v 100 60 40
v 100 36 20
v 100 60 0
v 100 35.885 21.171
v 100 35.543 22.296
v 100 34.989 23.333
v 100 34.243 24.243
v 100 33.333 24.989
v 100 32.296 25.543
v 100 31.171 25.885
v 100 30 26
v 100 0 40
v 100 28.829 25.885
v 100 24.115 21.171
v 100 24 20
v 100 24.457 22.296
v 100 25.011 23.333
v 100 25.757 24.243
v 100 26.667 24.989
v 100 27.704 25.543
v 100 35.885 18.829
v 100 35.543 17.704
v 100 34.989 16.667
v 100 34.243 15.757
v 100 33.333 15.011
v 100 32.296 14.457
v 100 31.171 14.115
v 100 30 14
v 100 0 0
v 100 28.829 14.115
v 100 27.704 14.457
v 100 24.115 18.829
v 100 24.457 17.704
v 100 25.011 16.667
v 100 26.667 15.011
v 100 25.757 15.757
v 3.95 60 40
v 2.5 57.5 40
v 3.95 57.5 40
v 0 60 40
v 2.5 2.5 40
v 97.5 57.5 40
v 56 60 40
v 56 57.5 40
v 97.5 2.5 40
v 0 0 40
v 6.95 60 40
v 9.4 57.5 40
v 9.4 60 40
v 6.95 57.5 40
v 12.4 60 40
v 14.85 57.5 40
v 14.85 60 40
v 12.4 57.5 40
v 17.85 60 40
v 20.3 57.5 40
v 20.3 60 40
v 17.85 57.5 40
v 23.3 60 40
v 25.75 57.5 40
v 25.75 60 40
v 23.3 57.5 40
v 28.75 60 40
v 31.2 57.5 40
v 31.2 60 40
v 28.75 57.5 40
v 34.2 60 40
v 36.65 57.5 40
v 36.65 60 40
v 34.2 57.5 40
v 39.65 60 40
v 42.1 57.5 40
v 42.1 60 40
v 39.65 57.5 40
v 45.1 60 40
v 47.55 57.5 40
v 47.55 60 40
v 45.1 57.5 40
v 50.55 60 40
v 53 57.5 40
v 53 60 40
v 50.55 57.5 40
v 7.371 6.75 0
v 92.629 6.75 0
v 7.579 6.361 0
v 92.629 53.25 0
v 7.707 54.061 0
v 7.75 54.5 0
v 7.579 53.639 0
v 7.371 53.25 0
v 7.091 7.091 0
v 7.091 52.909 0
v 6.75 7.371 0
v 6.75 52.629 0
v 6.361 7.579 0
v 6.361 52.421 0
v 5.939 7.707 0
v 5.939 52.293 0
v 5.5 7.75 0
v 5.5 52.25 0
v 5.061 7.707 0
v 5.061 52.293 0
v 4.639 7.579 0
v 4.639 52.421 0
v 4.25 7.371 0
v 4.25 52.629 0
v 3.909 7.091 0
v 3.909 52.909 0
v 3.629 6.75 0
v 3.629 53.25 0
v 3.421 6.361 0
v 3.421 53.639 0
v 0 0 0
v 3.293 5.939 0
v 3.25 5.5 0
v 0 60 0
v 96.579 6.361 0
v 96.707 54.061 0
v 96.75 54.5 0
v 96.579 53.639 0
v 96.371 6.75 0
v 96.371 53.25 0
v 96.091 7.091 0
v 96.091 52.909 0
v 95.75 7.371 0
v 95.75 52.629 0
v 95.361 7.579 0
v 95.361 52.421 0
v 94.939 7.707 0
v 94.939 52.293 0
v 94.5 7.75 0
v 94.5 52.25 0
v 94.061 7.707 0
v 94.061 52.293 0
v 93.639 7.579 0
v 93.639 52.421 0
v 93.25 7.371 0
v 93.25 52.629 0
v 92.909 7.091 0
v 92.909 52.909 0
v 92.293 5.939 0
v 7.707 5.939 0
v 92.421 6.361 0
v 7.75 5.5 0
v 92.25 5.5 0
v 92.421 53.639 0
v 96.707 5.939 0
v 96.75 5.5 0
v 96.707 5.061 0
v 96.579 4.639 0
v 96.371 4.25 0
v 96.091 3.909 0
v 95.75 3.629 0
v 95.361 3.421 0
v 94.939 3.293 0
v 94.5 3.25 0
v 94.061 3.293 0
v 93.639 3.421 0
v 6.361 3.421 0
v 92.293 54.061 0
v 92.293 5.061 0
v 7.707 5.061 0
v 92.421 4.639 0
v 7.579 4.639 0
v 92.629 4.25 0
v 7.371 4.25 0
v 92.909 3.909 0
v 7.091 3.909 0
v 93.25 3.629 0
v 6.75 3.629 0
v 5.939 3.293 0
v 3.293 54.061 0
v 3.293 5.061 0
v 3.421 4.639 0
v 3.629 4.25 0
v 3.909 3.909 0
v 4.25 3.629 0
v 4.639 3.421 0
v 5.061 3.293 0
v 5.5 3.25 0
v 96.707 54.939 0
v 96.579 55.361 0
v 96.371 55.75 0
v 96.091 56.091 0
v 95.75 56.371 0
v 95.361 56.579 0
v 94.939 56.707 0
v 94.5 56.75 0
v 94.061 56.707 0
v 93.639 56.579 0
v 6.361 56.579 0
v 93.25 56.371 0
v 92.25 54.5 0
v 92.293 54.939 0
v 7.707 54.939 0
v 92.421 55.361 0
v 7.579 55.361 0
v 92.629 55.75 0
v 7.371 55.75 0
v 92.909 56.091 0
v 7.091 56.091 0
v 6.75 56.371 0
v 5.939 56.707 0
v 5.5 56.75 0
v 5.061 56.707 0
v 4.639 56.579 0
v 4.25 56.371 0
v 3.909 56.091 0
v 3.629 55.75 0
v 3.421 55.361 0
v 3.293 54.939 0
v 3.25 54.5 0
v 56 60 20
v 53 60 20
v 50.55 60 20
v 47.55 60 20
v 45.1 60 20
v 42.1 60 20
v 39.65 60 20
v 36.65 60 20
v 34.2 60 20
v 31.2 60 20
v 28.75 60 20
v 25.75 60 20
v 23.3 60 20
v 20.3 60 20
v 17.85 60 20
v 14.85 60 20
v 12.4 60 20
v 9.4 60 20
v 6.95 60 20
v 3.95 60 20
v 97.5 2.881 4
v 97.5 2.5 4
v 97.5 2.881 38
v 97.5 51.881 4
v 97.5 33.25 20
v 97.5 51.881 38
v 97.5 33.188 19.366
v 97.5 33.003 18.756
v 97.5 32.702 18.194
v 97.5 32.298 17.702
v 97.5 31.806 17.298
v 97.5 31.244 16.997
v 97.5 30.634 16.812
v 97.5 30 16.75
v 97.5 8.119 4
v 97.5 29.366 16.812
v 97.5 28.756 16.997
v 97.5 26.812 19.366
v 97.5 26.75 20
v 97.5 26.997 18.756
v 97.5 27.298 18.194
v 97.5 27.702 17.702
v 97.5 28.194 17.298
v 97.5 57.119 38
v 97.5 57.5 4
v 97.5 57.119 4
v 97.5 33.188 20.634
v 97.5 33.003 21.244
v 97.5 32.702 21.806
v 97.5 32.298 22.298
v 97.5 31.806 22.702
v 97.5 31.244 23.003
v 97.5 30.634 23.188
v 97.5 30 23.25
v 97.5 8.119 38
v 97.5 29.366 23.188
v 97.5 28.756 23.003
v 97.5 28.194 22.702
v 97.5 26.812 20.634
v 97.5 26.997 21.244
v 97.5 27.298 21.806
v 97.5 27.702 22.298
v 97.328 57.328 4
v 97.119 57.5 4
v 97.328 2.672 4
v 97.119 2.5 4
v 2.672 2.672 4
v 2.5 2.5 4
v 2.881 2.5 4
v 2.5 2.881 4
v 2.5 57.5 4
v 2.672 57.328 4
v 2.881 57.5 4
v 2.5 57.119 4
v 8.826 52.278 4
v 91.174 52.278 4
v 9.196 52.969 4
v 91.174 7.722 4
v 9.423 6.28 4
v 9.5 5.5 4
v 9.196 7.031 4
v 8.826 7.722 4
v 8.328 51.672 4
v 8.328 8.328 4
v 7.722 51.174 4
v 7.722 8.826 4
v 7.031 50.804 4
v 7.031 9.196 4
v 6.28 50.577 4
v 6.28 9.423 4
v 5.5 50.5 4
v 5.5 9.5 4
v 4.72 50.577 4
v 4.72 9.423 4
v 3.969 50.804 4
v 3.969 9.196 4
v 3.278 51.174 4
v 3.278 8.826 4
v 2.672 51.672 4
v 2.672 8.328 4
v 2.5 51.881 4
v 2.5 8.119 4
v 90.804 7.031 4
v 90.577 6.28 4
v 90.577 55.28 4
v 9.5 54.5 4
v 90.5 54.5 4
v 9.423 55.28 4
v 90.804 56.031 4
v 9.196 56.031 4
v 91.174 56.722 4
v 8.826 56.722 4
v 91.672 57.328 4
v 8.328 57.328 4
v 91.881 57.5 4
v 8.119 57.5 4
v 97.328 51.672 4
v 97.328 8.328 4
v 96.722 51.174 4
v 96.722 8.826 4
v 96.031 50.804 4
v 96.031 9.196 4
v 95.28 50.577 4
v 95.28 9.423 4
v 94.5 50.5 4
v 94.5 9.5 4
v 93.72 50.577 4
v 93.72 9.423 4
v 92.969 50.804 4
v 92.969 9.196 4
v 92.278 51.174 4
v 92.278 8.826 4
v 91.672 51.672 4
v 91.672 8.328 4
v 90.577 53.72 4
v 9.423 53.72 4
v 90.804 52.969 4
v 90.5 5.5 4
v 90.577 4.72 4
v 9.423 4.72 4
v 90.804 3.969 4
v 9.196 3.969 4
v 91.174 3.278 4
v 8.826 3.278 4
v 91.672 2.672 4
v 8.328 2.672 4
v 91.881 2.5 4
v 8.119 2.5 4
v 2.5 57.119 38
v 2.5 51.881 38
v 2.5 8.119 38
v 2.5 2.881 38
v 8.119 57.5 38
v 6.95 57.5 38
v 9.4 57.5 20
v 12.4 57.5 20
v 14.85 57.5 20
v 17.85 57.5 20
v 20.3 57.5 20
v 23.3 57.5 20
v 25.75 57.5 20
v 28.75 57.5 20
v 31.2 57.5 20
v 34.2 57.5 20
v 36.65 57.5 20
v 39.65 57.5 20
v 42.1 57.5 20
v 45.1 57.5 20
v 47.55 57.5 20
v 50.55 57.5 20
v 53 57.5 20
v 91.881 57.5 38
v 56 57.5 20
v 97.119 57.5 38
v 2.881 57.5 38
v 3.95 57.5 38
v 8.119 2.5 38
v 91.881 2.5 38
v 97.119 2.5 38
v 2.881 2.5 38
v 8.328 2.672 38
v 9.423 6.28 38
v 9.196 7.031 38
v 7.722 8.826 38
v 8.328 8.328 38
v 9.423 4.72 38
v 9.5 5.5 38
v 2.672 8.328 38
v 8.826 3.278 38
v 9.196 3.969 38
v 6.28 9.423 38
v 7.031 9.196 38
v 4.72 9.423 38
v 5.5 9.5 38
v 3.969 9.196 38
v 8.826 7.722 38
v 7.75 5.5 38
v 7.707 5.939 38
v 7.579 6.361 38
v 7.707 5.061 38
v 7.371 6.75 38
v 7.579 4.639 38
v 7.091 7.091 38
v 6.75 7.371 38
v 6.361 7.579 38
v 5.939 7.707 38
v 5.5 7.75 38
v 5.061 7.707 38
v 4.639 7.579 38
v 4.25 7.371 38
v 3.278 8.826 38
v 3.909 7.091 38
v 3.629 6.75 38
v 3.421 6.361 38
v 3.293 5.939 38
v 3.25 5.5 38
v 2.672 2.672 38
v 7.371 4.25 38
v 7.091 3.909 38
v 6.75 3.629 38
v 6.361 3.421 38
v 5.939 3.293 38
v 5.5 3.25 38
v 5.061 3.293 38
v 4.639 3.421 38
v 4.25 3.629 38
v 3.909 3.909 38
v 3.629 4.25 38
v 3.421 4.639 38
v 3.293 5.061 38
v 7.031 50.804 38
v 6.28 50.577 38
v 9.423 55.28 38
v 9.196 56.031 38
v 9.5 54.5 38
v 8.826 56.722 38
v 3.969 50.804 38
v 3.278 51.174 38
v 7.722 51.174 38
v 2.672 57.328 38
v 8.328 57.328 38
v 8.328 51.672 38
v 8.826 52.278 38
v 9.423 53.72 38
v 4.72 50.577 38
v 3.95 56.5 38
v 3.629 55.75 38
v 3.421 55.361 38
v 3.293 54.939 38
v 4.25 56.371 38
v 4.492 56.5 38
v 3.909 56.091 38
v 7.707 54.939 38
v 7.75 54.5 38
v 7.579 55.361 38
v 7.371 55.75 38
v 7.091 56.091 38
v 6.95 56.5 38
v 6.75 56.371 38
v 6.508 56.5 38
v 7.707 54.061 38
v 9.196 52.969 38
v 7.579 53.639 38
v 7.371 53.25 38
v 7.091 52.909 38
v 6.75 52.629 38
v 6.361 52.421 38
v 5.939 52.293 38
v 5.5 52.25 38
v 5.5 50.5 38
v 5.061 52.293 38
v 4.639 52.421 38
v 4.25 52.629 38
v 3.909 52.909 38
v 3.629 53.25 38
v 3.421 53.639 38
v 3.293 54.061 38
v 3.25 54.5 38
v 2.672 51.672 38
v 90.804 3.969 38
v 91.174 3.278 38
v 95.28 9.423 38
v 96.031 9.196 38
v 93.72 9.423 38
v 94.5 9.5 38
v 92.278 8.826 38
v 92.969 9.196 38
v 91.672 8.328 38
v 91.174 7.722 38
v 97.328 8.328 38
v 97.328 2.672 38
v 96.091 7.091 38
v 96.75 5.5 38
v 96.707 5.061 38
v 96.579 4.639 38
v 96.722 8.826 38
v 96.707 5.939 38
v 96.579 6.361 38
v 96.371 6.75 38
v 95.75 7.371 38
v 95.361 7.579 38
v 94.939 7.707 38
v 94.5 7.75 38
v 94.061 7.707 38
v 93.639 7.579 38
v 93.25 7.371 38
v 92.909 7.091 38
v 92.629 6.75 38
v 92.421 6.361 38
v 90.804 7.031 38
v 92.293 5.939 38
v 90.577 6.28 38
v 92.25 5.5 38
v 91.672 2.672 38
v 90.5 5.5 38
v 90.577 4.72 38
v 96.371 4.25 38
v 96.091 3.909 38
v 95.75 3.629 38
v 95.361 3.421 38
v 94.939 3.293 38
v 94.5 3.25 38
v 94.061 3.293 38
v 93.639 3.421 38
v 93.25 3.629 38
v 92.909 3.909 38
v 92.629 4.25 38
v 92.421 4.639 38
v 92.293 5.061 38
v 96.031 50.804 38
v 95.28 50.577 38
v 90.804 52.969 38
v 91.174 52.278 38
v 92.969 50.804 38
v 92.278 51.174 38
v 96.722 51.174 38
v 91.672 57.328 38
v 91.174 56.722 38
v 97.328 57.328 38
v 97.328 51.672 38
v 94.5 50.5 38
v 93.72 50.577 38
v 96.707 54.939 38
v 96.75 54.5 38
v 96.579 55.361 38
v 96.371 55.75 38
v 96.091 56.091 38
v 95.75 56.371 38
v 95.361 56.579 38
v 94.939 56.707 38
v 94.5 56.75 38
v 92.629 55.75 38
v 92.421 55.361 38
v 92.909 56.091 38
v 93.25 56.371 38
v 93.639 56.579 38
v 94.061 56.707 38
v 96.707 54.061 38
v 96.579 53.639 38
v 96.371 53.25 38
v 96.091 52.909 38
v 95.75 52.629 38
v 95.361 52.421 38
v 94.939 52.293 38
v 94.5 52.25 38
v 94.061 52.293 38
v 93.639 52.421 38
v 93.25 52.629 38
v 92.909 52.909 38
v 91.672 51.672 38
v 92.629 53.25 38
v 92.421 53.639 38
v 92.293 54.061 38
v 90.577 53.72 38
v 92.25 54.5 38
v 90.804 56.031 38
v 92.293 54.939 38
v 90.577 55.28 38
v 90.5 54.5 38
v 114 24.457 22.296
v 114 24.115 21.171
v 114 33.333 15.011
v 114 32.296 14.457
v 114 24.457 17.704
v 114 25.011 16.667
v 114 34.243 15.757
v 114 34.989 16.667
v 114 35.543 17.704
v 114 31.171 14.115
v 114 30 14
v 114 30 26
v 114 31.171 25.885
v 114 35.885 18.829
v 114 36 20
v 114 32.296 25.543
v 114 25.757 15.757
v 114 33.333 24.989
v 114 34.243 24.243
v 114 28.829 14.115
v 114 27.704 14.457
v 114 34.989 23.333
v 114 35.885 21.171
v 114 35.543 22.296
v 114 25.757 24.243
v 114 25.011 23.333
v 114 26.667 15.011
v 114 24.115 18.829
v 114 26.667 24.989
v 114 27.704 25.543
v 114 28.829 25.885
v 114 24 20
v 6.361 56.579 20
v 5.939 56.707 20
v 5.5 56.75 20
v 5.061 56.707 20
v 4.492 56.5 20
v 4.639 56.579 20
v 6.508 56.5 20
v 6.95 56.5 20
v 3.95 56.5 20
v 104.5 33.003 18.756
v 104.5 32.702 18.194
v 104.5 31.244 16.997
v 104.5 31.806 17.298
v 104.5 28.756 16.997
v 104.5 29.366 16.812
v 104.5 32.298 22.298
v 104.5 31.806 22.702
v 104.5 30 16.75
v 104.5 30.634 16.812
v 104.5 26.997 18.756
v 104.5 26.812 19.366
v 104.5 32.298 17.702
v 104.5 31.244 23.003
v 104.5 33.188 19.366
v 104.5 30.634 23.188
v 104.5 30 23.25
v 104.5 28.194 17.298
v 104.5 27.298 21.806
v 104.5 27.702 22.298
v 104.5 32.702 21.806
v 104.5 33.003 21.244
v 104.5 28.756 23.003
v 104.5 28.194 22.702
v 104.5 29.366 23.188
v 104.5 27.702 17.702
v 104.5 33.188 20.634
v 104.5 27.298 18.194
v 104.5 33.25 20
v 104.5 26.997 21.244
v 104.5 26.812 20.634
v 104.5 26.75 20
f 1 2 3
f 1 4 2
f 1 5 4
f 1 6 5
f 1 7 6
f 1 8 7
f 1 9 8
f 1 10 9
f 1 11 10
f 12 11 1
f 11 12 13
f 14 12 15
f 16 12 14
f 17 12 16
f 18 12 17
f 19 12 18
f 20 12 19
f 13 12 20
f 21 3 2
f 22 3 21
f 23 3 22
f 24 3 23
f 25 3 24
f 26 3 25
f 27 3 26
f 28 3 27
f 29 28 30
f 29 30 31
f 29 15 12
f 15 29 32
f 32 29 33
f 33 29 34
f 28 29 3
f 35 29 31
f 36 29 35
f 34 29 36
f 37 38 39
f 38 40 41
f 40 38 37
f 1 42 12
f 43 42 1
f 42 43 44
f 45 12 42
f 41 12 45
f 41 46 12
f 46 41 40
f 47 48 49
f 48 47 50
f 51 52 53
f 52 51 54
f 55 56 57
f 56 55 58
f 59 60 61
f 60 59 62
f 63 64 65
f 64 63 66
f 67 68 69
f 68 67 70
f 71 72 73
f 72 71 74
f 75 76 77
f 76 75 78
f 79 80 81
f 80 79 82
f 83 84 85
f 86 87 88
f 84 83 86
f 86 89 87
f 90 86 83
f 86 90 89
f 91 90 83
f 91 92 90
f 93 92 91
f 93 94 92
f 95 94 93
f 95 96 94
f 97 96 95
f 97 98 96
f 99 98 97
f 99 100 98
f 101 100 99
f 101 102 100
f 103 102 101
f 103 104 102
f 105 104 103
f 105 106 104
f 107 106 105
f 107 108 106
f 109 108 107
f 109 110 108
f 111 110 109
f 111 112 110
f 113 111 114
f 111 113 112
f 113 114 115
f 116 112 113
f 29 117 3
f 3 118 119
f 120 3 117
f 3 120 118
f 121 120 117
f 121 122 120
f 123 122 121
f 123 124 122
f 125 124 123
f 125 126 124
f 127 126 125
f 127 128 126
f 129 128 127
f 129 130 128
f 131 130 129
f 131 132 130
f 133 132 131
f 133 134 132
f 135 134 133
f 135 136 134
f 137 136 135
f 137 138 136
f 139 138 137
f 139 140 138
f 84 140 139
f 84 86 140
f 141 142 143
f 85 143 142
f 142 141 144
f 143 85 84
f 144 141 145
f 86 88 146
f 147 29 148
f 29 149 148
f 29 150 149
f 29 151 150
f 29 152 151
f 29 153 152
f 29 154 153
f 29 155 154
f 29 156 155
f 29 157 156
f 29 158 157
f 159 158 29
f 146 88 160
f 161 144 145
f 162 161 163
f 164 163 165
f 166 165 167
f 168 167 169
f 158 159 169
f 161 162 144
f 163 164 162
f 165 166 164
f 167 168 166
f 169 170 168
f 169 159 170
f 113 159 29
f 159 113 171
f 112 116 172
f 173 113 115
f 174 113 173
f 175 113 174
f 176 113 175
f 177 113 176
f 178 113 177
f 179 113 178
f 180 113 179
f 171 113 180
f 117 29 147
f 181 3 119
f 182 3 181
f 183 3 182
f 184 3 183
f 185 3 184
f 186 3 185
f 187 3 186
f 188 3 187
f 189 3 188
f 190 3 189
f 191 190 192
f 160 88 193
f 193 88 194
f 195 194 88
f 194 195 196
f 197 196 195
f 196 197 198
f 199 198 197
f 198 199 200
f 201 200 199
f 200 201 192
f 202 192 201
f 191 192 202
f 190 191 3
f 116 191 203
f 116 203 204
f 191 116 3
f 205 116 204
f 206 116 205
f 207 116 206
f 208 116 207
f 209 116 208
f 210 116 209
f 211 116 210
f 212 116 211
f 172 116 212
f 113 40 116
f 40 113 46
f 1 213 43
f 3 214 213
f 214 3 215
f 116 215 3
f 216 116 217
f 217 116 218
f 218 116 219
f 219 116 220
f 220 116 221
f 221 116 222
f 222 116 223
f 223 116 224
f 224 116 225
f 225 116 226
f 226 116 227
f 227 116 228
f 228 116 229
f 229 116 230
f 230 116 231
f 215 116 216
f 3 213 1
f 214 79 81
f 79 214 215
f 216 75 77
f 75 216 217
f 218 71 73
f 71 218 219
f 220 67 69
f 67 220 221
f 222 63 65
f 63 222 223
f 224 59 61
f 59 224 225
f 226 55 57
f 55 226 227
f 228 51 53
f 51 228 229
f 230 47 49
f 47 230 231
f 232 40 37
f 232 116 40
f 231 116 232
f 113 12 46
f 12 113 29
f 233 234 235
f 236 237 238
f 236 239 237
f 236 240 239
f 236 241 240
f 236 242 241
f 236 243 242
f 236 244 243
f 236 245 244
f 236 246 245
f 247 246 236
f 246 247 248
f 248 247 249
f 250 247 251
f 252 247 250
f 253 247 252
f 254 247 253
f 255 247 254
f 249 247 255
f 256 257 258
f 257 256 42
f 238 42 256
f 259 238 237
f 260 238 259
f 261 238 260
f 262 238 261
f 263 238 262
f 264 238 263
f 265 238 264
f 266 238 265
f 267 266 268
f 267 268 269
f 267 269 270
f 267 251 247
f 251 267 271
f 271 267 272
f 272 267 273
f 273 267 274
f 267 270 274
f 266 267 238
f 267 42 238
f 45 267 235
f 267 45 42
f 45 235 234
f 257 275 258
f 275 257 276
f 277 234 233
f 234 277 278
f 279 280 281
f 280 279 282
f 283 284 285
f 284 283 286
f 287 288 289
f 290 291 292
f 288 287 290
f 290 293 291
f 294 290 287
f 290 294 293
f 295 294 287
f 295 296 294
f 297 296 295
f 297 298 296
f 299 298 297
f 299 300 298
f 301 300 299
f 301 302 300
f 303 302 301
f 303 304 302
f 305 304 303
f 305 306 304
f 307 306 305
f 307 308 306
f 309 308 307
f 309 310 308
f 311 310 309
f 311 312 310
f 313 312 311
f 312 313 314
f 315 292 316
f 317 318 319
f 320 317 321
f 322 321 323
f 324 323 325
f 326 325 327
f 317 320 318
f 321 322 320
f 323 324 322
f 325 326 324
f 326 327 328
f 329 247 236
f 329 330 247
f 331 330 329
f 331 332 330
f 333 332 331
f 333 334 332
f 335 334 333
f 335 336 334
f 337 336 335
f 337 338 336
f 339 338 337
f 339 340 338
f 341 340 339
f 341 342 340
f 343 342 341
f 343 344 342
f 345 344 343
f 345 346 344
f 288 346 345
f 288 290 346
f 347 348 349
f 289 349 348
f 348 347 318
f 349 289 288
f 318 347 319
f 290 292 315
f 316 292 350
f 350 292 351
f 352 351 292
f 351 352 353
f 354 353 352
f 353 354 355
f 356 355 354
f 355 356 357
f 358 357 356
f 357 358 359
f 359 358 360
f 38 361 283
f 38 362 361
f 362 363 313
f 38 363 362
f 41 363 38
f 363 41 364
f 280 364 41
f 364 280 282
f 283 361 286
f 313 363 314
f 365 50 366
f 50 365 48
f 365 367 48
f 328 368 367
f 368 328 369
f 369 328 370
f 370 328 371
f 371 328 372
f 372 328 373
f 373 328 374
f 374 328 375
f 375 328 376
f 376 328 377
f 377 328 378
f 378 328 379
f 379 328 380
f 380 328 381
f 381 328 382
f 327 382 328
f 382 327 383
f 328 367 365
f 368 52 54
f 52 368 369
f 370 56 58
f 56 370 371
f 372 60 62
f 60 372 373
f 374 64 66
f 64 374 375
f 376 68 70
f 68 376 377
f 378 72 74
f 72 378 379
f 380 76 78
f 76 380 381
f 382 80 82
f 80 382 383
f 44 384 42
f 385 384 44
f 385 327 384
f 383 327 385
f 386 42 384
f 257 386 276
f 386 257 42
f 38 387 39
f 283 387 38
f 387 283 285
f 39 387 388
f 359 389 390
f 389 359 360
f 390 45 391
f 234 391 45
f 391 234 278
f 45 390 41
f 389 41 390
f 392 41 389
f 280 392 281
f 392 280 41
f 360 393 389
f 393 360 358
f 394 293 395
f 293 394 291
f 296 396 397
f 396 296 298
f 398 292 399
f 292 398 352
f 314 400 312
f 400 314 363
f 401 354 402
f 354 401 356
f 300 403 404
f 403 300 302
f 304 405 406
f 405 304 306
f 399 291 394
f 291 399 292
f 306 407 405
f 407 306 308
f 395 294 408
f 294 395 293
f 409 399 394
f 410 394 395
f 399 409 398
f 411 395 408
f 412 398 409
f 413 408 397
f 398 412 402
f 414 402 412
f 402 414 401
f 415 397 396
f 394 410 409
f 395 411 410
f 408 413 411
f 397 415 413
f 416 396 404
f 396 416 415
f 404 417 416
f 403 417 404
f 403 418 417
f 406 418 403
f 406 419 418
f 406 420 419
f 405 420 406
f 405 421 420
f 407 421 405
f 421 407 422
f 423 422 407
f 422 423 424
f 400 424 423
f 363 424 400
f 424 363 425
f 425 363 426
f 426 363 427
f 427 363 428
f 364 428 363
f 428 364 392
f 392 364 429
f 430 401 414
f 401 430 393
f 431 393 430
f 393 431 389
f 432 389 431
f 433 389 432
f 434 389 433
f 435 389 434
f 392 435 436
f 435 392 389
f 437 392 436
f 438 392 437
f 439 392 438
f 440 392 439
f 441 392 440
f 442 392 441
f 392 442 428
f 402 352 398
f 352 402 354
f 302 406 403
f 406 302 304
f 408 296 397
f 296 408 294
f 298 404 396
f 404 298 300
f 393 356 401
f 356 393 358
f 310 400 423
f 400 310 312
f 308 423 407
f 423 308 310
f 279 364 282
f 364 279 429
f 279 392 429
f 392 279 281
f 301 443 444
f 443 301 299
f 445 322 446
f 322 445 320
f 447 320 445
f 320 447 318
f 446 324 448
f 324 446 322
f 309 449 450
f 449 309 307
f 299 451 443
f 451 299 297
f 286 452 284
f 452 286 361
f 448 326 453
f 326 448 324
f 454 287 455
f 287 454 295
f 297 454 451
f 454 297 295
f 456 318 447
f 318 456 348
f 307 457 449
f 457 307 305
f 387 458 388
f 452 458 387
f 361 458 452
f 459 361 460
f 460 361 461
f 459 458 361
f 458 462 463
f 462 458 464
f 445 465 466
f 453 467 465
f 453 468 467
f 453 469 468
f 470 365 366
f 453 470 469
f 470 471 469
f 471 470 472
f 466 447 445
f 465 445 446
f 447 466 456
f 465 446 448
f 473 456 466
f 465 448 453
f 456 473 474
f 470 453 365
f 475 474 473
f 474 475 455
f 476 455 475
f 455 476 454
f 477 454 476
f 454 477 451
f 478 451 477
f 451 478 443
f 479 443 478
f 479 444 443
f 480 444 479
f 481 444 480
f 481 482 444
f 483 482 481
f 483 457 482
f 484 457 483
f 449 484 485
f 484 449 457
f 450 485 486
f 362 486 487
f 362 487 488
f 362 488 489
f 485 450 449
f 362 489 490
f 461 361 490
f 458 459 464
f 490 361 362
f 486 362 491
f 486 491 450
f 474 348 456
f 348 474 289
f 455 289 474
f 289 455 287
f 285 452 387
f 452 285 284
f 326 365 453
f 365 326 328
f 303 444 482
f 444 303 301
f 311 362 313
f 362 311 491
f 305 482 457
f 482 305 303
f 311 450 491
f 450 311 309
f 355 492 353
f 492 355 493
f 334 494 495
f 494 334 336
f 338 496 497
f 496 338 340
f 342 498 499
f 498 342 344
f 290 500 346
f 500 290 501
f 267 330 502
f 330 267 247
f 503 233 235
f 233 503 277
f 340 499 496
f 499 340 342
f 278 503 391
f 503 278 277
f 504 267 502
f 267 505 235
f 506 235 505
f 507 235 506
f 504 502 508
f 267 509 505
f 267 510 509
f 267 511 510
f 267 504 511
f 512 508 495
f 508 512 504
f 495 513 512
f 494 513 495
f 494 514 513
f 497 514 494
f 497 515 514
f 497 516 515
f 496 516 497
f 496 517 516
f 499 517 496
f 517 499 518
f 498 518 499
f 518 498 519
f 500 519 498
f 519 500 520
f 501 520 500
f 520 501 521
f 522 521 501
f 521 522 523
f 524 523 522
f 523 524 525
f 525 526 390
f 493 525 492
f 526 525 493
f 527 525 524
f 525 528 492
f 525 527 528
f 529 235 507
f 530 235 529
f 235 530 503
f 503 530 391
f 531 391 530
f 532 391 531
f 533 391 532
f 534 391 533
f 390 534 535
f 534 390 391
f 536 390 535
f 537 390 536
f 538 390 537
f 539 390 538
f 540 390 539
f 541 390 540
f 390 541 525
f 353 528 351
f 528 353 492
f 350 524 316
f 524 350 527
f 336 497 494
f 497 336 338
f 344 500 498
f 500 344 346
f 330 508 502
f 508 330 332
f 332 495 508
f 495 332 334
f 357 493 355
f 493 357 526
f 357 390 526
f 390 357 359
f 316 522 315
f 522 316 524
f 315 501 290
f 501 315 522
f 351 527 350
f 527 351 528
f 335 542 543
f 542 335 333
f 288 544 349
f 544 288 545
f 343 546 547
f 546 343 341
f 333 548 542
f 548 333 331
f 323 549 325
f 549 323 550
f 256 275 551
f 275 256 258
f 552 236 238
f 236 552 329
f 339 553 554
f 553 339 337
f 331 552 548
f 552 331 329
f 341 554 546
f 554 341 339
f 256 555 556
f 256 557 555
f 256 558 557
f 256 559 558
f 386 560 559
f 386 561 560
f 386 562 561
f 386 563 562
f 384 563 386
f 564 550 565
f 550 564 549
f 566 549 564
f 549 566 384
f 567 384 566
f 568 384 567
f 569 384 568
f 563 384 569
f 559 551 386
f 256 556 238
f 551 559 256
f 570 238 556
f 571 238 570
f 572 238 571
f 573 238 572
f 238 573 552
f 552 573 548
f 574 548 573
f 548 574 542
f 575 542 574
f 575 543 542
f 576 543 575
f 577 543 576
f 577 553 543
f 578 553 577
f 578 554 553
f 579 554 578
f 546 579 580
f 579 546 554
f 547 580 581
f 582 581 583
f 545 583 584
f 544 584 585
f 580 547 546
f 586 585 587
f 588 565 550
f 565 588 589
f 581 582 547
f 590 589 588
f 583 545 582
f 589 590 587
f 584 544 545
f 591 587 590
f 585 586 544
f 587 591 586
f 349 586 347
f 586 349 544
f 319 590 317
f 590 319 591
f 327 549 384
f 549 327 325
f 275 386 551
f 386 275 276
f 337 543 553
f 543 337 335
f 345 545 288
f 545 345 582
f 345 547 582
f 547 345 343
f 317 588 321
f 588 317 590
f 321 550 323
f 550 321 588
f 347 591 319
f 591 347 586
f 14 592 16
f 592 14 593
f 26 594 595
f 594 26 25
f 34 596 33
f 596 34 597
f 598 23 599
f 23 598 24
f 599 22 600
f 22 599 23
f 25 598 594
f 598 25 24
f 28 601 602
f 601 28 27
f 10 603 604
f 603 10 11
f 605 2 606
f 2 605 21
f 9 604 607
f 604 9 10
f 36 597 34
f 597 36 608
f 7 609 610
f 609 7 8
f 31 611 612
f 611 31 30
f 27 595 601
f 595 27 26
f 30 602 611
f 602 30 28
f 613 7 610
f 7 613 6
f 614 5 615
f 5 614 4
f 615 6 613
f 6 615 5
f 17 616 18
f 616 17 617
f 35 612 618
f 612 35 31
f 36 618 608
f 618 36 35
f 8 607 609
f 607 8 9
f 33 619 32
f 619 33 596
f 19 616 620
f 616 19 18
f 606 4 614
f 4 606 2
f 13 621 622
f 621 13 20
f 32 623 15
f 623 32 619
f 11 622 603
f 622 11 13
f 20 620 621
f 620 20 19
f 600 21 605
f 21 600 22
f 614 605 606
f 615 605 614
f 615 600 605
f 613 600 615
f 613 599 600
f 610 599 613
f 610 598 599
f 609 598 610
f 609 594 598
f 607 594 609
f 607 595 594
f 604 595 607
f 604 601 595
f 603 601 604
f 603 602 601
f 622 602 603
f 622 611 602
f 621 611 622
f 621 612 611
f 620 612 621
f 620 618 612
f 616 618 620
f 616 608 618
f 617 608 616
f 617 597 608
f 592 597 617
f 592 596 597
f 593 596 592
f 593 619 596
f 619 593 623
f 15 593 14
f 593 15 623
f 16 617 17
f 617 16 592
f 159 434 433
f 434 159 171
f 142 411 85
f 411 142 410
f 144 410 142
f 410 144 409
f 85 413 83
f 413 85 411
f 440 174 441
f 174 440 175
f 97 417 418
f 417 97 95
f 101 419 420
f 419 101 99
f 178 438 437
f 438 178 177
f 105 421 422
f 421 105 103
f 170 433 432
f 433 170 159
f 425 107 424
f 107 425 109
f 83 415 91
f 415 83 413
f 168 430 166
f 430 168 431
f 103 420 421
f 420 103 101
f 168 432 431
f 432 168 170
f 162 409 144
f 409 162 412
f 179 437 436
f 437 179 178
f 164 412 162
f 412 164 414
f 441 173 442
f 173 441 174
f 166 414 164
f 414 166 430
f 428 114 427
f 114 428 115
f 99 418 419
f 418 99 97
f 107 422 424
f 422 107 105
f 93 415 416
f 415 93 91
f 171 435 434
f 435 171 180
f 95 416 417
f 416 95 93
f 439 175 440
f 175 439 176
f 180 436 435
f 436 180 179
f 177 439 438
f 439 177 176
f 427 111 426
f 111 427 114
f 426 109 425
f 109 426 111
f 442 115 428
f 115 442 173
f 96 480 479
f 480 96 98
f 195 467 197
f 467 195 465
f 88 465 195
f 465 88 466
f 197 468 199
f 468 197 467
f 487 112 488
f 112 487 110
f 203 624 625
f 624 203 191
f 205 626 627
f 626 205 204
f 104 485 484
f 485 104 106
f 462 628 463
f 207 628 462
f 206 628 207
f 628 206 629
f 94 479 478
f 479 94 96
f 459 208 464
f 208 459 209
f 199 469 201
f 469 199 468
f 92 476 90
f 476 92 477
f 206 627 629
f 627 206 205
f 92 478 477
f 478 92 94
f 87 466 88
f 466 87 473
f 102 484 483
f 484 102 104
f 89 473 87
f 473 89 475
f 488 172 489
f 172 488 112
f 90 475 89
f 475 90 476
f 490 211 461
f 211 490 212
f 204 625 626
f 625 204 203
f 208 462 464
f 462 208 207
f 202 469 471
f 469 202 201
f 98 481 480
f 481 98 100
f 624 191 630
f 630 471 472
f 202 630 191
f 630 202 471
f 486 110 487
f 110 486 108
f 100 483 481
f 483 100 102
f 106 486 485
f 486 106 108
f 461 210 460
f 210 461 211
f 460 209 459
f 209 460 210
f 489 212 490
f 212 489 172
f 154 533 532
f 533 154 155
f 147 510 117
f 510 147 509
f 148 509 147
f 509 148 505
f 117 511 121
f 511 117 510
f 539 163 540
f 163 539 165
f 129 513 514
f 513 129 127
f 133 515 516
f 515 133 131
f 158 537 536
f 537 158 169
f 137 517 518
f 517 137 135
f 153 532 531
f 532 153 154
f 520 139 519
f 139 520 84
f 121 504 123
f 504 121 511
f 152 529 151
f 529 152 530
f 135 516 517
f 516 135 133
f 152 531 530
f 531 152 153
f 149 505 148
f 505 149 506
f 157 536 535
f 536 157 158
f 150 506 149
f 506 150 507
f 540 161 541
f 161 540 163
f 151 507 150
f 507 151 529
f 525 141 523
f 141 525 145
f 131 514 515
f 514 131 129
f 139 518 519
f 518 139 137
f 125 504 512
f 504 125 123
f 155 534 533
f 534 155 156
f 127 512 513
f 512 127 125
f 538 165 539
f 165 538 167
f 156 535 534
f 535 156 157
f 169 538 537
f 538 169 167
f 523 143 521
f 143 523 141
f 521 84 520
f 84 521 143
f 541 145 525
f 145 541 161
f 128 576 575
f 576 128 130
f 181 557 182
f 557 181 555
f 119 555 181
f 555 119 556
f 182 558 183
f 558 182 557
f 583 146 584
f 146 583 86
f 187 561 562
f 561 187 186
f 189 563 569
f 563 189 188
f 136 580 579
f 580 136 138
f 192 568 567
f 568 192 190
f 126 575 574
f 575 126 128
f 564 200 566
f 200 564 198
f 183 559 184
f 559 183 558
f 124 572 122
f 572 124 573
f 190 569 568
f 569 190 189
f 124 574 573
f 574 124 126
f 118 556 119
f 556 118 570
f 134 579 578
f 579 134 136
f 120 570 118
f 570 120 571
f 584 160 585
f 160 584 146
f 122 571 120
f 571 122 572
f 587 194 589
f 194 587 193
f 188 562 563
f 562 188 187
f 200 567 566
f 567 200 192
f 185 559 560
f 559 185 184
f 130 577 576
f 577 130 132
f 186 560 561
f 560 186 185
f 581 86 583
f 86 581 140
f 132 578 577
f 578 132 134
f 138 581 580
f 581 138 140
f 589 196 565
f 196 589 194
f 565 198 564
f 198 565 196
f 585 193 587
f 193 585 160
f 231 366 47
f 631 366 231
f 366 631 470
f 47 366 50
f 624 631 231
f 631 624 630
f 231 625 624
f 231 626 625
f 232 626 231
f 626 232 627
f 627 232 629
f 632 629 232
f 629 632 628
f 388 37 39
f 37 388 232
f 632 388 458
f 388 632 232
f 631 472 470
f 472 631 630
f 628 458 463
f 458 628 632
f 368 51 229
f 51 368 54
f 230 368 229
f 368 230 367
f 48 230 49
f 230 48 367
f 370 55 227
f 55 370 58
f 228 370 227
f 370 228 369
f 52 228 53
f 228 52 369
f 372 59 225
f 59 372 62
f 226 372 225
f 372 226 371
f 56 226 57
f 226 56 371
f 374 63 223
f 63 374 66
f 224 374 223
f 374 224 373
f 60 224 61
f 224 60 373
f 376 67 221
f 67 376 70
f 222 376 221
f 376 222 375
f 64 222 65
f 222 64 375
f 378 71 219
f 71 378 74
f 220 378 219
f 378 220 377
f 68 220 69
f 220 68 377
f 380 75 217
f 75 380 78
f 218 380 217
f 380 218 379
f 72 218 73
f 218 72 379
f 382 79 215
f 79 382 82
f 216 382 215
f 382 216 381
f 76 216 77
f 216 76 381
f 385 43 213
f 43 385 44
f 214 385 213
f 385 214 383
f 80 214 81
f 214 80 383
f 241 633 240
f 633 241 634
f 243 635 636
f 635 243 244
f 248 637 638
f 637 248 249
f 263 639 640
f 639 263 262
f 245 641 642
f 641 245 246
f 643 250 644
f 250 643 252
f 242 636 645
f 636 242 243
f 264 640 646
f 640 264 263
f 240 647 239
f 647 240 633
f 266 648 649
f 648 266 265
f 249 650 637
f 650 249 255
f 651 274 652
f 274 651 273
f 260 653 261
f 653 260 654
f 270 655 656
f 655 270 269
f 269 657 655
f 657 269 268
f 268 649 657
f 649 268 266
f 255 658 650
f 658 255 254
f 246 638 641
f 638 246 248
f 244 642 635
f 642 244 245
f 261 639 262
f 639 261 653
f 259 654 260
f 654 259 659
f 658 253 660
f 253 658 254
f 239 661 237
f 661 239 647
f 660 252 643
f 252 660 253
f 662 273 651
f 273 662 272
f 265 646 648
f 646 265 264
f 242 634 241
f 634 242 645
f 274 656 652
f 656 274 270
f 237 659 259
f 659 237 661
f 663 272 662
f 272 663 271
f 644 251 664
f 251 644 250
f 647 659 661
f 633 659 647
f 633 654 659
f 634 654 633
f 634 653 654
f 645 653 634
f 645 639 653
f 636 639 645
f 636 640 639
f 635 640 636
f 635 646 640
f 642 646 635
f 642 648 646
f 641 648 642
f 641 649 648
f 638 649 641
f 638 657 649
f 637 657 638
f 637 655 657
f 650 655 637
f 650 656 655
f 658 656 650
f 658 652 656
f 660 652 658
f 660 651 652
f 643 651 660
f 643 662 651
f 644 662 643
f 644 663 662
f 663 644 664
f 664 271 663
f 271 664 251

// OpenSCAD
$fn = 32;

// ----------------------------------------------------------------------
// Enclosure body: 100 x 60 x 40 mm, wall 2.5 mm
// ----------------------------------------------------------------------

// --- parameters (mm) ---
length = 100;             // outside length, X
width = 60;               // outside width, Y
height = 40;              // outside height, Z
wall = 2.5;               // side wall thickness
floor_t = 4;              // floor thickness
boss_d = 8;               // corner boss diameter
boss_h = 34;              // corner boss height above the floor
boss_hole_d = 4.5;        // lid screw clearance in the boss
boss_lip = 5.5;           // boss centre inset from the corner
vent_slots = 10;          // vent slots in the long wall
vent_w = 3;               // vent slot width
vent_h = 25;              // vent slot height
vent_pitch = 5.45;        // vent slot pitch
vent_z = 20;              // vent slot sill height
nipple_d = 12;            // cable gland boss diameter
nipple_h = 14;            // cable gland boss height
nipple_bore = 6.5;        // cable gland bore

module shell() {
  difference() {
    cube([length, width, height]);
    /* hollow, open at the top */
    translate([wall, wall, floor_t])
      cube([length - 2 * wall, width - 2 * wall, height]);
  }
}

module bosses() {
  /* corner bosses, sunk 1 mm into the floor */
  for (sx = [0, 1]) for (sy = [0, 1])
    translate([sx * (length - 2 * boss_lip) + boss_lip, sy * (width - 2 * boss_lip) + boss_lip, floor_t - 1])
      cylinder(h = boss_h + 1, d = boss_d);
}

module gland() {
  /* boss on the short wall, sunk 1 mm into it */
  translate([length - 1, width / 2, height * 0.5]) rotate([0, 90, 0])
    cylinder(h = nipple_h + 1, d = nipple_d);
}

difference() {
  union() {
    shell();
    bosses();
    gland();
  }
  /* boss screw holes */
  for (sx = [0, 1]) for (sy = [0, 1])
    translate([sx * (length - 2 * boss_lip) + boss_lip, sy * (width - 2 * boss_lip) + boss_lip, -1]) cylinder(h = floor_t + boss_h + 2, d = boss_hole_d);
  /* vent grille in the +Y wall */
  for (i = [0 : vent_slots - 1]) translate([vent_pitch * (i + 1) - vent_w / 2, width - wall - 1, vent_z]) cube([vent_w, wall + 2, vent_h]);
  translate([length, width / 2, height * 0.5]) rotate([0, 90, 0]) translate([0, 0, -nipple_h - 2]) cylinder(h = nipple_h + wall + 4, d = nipple_bore);
}
